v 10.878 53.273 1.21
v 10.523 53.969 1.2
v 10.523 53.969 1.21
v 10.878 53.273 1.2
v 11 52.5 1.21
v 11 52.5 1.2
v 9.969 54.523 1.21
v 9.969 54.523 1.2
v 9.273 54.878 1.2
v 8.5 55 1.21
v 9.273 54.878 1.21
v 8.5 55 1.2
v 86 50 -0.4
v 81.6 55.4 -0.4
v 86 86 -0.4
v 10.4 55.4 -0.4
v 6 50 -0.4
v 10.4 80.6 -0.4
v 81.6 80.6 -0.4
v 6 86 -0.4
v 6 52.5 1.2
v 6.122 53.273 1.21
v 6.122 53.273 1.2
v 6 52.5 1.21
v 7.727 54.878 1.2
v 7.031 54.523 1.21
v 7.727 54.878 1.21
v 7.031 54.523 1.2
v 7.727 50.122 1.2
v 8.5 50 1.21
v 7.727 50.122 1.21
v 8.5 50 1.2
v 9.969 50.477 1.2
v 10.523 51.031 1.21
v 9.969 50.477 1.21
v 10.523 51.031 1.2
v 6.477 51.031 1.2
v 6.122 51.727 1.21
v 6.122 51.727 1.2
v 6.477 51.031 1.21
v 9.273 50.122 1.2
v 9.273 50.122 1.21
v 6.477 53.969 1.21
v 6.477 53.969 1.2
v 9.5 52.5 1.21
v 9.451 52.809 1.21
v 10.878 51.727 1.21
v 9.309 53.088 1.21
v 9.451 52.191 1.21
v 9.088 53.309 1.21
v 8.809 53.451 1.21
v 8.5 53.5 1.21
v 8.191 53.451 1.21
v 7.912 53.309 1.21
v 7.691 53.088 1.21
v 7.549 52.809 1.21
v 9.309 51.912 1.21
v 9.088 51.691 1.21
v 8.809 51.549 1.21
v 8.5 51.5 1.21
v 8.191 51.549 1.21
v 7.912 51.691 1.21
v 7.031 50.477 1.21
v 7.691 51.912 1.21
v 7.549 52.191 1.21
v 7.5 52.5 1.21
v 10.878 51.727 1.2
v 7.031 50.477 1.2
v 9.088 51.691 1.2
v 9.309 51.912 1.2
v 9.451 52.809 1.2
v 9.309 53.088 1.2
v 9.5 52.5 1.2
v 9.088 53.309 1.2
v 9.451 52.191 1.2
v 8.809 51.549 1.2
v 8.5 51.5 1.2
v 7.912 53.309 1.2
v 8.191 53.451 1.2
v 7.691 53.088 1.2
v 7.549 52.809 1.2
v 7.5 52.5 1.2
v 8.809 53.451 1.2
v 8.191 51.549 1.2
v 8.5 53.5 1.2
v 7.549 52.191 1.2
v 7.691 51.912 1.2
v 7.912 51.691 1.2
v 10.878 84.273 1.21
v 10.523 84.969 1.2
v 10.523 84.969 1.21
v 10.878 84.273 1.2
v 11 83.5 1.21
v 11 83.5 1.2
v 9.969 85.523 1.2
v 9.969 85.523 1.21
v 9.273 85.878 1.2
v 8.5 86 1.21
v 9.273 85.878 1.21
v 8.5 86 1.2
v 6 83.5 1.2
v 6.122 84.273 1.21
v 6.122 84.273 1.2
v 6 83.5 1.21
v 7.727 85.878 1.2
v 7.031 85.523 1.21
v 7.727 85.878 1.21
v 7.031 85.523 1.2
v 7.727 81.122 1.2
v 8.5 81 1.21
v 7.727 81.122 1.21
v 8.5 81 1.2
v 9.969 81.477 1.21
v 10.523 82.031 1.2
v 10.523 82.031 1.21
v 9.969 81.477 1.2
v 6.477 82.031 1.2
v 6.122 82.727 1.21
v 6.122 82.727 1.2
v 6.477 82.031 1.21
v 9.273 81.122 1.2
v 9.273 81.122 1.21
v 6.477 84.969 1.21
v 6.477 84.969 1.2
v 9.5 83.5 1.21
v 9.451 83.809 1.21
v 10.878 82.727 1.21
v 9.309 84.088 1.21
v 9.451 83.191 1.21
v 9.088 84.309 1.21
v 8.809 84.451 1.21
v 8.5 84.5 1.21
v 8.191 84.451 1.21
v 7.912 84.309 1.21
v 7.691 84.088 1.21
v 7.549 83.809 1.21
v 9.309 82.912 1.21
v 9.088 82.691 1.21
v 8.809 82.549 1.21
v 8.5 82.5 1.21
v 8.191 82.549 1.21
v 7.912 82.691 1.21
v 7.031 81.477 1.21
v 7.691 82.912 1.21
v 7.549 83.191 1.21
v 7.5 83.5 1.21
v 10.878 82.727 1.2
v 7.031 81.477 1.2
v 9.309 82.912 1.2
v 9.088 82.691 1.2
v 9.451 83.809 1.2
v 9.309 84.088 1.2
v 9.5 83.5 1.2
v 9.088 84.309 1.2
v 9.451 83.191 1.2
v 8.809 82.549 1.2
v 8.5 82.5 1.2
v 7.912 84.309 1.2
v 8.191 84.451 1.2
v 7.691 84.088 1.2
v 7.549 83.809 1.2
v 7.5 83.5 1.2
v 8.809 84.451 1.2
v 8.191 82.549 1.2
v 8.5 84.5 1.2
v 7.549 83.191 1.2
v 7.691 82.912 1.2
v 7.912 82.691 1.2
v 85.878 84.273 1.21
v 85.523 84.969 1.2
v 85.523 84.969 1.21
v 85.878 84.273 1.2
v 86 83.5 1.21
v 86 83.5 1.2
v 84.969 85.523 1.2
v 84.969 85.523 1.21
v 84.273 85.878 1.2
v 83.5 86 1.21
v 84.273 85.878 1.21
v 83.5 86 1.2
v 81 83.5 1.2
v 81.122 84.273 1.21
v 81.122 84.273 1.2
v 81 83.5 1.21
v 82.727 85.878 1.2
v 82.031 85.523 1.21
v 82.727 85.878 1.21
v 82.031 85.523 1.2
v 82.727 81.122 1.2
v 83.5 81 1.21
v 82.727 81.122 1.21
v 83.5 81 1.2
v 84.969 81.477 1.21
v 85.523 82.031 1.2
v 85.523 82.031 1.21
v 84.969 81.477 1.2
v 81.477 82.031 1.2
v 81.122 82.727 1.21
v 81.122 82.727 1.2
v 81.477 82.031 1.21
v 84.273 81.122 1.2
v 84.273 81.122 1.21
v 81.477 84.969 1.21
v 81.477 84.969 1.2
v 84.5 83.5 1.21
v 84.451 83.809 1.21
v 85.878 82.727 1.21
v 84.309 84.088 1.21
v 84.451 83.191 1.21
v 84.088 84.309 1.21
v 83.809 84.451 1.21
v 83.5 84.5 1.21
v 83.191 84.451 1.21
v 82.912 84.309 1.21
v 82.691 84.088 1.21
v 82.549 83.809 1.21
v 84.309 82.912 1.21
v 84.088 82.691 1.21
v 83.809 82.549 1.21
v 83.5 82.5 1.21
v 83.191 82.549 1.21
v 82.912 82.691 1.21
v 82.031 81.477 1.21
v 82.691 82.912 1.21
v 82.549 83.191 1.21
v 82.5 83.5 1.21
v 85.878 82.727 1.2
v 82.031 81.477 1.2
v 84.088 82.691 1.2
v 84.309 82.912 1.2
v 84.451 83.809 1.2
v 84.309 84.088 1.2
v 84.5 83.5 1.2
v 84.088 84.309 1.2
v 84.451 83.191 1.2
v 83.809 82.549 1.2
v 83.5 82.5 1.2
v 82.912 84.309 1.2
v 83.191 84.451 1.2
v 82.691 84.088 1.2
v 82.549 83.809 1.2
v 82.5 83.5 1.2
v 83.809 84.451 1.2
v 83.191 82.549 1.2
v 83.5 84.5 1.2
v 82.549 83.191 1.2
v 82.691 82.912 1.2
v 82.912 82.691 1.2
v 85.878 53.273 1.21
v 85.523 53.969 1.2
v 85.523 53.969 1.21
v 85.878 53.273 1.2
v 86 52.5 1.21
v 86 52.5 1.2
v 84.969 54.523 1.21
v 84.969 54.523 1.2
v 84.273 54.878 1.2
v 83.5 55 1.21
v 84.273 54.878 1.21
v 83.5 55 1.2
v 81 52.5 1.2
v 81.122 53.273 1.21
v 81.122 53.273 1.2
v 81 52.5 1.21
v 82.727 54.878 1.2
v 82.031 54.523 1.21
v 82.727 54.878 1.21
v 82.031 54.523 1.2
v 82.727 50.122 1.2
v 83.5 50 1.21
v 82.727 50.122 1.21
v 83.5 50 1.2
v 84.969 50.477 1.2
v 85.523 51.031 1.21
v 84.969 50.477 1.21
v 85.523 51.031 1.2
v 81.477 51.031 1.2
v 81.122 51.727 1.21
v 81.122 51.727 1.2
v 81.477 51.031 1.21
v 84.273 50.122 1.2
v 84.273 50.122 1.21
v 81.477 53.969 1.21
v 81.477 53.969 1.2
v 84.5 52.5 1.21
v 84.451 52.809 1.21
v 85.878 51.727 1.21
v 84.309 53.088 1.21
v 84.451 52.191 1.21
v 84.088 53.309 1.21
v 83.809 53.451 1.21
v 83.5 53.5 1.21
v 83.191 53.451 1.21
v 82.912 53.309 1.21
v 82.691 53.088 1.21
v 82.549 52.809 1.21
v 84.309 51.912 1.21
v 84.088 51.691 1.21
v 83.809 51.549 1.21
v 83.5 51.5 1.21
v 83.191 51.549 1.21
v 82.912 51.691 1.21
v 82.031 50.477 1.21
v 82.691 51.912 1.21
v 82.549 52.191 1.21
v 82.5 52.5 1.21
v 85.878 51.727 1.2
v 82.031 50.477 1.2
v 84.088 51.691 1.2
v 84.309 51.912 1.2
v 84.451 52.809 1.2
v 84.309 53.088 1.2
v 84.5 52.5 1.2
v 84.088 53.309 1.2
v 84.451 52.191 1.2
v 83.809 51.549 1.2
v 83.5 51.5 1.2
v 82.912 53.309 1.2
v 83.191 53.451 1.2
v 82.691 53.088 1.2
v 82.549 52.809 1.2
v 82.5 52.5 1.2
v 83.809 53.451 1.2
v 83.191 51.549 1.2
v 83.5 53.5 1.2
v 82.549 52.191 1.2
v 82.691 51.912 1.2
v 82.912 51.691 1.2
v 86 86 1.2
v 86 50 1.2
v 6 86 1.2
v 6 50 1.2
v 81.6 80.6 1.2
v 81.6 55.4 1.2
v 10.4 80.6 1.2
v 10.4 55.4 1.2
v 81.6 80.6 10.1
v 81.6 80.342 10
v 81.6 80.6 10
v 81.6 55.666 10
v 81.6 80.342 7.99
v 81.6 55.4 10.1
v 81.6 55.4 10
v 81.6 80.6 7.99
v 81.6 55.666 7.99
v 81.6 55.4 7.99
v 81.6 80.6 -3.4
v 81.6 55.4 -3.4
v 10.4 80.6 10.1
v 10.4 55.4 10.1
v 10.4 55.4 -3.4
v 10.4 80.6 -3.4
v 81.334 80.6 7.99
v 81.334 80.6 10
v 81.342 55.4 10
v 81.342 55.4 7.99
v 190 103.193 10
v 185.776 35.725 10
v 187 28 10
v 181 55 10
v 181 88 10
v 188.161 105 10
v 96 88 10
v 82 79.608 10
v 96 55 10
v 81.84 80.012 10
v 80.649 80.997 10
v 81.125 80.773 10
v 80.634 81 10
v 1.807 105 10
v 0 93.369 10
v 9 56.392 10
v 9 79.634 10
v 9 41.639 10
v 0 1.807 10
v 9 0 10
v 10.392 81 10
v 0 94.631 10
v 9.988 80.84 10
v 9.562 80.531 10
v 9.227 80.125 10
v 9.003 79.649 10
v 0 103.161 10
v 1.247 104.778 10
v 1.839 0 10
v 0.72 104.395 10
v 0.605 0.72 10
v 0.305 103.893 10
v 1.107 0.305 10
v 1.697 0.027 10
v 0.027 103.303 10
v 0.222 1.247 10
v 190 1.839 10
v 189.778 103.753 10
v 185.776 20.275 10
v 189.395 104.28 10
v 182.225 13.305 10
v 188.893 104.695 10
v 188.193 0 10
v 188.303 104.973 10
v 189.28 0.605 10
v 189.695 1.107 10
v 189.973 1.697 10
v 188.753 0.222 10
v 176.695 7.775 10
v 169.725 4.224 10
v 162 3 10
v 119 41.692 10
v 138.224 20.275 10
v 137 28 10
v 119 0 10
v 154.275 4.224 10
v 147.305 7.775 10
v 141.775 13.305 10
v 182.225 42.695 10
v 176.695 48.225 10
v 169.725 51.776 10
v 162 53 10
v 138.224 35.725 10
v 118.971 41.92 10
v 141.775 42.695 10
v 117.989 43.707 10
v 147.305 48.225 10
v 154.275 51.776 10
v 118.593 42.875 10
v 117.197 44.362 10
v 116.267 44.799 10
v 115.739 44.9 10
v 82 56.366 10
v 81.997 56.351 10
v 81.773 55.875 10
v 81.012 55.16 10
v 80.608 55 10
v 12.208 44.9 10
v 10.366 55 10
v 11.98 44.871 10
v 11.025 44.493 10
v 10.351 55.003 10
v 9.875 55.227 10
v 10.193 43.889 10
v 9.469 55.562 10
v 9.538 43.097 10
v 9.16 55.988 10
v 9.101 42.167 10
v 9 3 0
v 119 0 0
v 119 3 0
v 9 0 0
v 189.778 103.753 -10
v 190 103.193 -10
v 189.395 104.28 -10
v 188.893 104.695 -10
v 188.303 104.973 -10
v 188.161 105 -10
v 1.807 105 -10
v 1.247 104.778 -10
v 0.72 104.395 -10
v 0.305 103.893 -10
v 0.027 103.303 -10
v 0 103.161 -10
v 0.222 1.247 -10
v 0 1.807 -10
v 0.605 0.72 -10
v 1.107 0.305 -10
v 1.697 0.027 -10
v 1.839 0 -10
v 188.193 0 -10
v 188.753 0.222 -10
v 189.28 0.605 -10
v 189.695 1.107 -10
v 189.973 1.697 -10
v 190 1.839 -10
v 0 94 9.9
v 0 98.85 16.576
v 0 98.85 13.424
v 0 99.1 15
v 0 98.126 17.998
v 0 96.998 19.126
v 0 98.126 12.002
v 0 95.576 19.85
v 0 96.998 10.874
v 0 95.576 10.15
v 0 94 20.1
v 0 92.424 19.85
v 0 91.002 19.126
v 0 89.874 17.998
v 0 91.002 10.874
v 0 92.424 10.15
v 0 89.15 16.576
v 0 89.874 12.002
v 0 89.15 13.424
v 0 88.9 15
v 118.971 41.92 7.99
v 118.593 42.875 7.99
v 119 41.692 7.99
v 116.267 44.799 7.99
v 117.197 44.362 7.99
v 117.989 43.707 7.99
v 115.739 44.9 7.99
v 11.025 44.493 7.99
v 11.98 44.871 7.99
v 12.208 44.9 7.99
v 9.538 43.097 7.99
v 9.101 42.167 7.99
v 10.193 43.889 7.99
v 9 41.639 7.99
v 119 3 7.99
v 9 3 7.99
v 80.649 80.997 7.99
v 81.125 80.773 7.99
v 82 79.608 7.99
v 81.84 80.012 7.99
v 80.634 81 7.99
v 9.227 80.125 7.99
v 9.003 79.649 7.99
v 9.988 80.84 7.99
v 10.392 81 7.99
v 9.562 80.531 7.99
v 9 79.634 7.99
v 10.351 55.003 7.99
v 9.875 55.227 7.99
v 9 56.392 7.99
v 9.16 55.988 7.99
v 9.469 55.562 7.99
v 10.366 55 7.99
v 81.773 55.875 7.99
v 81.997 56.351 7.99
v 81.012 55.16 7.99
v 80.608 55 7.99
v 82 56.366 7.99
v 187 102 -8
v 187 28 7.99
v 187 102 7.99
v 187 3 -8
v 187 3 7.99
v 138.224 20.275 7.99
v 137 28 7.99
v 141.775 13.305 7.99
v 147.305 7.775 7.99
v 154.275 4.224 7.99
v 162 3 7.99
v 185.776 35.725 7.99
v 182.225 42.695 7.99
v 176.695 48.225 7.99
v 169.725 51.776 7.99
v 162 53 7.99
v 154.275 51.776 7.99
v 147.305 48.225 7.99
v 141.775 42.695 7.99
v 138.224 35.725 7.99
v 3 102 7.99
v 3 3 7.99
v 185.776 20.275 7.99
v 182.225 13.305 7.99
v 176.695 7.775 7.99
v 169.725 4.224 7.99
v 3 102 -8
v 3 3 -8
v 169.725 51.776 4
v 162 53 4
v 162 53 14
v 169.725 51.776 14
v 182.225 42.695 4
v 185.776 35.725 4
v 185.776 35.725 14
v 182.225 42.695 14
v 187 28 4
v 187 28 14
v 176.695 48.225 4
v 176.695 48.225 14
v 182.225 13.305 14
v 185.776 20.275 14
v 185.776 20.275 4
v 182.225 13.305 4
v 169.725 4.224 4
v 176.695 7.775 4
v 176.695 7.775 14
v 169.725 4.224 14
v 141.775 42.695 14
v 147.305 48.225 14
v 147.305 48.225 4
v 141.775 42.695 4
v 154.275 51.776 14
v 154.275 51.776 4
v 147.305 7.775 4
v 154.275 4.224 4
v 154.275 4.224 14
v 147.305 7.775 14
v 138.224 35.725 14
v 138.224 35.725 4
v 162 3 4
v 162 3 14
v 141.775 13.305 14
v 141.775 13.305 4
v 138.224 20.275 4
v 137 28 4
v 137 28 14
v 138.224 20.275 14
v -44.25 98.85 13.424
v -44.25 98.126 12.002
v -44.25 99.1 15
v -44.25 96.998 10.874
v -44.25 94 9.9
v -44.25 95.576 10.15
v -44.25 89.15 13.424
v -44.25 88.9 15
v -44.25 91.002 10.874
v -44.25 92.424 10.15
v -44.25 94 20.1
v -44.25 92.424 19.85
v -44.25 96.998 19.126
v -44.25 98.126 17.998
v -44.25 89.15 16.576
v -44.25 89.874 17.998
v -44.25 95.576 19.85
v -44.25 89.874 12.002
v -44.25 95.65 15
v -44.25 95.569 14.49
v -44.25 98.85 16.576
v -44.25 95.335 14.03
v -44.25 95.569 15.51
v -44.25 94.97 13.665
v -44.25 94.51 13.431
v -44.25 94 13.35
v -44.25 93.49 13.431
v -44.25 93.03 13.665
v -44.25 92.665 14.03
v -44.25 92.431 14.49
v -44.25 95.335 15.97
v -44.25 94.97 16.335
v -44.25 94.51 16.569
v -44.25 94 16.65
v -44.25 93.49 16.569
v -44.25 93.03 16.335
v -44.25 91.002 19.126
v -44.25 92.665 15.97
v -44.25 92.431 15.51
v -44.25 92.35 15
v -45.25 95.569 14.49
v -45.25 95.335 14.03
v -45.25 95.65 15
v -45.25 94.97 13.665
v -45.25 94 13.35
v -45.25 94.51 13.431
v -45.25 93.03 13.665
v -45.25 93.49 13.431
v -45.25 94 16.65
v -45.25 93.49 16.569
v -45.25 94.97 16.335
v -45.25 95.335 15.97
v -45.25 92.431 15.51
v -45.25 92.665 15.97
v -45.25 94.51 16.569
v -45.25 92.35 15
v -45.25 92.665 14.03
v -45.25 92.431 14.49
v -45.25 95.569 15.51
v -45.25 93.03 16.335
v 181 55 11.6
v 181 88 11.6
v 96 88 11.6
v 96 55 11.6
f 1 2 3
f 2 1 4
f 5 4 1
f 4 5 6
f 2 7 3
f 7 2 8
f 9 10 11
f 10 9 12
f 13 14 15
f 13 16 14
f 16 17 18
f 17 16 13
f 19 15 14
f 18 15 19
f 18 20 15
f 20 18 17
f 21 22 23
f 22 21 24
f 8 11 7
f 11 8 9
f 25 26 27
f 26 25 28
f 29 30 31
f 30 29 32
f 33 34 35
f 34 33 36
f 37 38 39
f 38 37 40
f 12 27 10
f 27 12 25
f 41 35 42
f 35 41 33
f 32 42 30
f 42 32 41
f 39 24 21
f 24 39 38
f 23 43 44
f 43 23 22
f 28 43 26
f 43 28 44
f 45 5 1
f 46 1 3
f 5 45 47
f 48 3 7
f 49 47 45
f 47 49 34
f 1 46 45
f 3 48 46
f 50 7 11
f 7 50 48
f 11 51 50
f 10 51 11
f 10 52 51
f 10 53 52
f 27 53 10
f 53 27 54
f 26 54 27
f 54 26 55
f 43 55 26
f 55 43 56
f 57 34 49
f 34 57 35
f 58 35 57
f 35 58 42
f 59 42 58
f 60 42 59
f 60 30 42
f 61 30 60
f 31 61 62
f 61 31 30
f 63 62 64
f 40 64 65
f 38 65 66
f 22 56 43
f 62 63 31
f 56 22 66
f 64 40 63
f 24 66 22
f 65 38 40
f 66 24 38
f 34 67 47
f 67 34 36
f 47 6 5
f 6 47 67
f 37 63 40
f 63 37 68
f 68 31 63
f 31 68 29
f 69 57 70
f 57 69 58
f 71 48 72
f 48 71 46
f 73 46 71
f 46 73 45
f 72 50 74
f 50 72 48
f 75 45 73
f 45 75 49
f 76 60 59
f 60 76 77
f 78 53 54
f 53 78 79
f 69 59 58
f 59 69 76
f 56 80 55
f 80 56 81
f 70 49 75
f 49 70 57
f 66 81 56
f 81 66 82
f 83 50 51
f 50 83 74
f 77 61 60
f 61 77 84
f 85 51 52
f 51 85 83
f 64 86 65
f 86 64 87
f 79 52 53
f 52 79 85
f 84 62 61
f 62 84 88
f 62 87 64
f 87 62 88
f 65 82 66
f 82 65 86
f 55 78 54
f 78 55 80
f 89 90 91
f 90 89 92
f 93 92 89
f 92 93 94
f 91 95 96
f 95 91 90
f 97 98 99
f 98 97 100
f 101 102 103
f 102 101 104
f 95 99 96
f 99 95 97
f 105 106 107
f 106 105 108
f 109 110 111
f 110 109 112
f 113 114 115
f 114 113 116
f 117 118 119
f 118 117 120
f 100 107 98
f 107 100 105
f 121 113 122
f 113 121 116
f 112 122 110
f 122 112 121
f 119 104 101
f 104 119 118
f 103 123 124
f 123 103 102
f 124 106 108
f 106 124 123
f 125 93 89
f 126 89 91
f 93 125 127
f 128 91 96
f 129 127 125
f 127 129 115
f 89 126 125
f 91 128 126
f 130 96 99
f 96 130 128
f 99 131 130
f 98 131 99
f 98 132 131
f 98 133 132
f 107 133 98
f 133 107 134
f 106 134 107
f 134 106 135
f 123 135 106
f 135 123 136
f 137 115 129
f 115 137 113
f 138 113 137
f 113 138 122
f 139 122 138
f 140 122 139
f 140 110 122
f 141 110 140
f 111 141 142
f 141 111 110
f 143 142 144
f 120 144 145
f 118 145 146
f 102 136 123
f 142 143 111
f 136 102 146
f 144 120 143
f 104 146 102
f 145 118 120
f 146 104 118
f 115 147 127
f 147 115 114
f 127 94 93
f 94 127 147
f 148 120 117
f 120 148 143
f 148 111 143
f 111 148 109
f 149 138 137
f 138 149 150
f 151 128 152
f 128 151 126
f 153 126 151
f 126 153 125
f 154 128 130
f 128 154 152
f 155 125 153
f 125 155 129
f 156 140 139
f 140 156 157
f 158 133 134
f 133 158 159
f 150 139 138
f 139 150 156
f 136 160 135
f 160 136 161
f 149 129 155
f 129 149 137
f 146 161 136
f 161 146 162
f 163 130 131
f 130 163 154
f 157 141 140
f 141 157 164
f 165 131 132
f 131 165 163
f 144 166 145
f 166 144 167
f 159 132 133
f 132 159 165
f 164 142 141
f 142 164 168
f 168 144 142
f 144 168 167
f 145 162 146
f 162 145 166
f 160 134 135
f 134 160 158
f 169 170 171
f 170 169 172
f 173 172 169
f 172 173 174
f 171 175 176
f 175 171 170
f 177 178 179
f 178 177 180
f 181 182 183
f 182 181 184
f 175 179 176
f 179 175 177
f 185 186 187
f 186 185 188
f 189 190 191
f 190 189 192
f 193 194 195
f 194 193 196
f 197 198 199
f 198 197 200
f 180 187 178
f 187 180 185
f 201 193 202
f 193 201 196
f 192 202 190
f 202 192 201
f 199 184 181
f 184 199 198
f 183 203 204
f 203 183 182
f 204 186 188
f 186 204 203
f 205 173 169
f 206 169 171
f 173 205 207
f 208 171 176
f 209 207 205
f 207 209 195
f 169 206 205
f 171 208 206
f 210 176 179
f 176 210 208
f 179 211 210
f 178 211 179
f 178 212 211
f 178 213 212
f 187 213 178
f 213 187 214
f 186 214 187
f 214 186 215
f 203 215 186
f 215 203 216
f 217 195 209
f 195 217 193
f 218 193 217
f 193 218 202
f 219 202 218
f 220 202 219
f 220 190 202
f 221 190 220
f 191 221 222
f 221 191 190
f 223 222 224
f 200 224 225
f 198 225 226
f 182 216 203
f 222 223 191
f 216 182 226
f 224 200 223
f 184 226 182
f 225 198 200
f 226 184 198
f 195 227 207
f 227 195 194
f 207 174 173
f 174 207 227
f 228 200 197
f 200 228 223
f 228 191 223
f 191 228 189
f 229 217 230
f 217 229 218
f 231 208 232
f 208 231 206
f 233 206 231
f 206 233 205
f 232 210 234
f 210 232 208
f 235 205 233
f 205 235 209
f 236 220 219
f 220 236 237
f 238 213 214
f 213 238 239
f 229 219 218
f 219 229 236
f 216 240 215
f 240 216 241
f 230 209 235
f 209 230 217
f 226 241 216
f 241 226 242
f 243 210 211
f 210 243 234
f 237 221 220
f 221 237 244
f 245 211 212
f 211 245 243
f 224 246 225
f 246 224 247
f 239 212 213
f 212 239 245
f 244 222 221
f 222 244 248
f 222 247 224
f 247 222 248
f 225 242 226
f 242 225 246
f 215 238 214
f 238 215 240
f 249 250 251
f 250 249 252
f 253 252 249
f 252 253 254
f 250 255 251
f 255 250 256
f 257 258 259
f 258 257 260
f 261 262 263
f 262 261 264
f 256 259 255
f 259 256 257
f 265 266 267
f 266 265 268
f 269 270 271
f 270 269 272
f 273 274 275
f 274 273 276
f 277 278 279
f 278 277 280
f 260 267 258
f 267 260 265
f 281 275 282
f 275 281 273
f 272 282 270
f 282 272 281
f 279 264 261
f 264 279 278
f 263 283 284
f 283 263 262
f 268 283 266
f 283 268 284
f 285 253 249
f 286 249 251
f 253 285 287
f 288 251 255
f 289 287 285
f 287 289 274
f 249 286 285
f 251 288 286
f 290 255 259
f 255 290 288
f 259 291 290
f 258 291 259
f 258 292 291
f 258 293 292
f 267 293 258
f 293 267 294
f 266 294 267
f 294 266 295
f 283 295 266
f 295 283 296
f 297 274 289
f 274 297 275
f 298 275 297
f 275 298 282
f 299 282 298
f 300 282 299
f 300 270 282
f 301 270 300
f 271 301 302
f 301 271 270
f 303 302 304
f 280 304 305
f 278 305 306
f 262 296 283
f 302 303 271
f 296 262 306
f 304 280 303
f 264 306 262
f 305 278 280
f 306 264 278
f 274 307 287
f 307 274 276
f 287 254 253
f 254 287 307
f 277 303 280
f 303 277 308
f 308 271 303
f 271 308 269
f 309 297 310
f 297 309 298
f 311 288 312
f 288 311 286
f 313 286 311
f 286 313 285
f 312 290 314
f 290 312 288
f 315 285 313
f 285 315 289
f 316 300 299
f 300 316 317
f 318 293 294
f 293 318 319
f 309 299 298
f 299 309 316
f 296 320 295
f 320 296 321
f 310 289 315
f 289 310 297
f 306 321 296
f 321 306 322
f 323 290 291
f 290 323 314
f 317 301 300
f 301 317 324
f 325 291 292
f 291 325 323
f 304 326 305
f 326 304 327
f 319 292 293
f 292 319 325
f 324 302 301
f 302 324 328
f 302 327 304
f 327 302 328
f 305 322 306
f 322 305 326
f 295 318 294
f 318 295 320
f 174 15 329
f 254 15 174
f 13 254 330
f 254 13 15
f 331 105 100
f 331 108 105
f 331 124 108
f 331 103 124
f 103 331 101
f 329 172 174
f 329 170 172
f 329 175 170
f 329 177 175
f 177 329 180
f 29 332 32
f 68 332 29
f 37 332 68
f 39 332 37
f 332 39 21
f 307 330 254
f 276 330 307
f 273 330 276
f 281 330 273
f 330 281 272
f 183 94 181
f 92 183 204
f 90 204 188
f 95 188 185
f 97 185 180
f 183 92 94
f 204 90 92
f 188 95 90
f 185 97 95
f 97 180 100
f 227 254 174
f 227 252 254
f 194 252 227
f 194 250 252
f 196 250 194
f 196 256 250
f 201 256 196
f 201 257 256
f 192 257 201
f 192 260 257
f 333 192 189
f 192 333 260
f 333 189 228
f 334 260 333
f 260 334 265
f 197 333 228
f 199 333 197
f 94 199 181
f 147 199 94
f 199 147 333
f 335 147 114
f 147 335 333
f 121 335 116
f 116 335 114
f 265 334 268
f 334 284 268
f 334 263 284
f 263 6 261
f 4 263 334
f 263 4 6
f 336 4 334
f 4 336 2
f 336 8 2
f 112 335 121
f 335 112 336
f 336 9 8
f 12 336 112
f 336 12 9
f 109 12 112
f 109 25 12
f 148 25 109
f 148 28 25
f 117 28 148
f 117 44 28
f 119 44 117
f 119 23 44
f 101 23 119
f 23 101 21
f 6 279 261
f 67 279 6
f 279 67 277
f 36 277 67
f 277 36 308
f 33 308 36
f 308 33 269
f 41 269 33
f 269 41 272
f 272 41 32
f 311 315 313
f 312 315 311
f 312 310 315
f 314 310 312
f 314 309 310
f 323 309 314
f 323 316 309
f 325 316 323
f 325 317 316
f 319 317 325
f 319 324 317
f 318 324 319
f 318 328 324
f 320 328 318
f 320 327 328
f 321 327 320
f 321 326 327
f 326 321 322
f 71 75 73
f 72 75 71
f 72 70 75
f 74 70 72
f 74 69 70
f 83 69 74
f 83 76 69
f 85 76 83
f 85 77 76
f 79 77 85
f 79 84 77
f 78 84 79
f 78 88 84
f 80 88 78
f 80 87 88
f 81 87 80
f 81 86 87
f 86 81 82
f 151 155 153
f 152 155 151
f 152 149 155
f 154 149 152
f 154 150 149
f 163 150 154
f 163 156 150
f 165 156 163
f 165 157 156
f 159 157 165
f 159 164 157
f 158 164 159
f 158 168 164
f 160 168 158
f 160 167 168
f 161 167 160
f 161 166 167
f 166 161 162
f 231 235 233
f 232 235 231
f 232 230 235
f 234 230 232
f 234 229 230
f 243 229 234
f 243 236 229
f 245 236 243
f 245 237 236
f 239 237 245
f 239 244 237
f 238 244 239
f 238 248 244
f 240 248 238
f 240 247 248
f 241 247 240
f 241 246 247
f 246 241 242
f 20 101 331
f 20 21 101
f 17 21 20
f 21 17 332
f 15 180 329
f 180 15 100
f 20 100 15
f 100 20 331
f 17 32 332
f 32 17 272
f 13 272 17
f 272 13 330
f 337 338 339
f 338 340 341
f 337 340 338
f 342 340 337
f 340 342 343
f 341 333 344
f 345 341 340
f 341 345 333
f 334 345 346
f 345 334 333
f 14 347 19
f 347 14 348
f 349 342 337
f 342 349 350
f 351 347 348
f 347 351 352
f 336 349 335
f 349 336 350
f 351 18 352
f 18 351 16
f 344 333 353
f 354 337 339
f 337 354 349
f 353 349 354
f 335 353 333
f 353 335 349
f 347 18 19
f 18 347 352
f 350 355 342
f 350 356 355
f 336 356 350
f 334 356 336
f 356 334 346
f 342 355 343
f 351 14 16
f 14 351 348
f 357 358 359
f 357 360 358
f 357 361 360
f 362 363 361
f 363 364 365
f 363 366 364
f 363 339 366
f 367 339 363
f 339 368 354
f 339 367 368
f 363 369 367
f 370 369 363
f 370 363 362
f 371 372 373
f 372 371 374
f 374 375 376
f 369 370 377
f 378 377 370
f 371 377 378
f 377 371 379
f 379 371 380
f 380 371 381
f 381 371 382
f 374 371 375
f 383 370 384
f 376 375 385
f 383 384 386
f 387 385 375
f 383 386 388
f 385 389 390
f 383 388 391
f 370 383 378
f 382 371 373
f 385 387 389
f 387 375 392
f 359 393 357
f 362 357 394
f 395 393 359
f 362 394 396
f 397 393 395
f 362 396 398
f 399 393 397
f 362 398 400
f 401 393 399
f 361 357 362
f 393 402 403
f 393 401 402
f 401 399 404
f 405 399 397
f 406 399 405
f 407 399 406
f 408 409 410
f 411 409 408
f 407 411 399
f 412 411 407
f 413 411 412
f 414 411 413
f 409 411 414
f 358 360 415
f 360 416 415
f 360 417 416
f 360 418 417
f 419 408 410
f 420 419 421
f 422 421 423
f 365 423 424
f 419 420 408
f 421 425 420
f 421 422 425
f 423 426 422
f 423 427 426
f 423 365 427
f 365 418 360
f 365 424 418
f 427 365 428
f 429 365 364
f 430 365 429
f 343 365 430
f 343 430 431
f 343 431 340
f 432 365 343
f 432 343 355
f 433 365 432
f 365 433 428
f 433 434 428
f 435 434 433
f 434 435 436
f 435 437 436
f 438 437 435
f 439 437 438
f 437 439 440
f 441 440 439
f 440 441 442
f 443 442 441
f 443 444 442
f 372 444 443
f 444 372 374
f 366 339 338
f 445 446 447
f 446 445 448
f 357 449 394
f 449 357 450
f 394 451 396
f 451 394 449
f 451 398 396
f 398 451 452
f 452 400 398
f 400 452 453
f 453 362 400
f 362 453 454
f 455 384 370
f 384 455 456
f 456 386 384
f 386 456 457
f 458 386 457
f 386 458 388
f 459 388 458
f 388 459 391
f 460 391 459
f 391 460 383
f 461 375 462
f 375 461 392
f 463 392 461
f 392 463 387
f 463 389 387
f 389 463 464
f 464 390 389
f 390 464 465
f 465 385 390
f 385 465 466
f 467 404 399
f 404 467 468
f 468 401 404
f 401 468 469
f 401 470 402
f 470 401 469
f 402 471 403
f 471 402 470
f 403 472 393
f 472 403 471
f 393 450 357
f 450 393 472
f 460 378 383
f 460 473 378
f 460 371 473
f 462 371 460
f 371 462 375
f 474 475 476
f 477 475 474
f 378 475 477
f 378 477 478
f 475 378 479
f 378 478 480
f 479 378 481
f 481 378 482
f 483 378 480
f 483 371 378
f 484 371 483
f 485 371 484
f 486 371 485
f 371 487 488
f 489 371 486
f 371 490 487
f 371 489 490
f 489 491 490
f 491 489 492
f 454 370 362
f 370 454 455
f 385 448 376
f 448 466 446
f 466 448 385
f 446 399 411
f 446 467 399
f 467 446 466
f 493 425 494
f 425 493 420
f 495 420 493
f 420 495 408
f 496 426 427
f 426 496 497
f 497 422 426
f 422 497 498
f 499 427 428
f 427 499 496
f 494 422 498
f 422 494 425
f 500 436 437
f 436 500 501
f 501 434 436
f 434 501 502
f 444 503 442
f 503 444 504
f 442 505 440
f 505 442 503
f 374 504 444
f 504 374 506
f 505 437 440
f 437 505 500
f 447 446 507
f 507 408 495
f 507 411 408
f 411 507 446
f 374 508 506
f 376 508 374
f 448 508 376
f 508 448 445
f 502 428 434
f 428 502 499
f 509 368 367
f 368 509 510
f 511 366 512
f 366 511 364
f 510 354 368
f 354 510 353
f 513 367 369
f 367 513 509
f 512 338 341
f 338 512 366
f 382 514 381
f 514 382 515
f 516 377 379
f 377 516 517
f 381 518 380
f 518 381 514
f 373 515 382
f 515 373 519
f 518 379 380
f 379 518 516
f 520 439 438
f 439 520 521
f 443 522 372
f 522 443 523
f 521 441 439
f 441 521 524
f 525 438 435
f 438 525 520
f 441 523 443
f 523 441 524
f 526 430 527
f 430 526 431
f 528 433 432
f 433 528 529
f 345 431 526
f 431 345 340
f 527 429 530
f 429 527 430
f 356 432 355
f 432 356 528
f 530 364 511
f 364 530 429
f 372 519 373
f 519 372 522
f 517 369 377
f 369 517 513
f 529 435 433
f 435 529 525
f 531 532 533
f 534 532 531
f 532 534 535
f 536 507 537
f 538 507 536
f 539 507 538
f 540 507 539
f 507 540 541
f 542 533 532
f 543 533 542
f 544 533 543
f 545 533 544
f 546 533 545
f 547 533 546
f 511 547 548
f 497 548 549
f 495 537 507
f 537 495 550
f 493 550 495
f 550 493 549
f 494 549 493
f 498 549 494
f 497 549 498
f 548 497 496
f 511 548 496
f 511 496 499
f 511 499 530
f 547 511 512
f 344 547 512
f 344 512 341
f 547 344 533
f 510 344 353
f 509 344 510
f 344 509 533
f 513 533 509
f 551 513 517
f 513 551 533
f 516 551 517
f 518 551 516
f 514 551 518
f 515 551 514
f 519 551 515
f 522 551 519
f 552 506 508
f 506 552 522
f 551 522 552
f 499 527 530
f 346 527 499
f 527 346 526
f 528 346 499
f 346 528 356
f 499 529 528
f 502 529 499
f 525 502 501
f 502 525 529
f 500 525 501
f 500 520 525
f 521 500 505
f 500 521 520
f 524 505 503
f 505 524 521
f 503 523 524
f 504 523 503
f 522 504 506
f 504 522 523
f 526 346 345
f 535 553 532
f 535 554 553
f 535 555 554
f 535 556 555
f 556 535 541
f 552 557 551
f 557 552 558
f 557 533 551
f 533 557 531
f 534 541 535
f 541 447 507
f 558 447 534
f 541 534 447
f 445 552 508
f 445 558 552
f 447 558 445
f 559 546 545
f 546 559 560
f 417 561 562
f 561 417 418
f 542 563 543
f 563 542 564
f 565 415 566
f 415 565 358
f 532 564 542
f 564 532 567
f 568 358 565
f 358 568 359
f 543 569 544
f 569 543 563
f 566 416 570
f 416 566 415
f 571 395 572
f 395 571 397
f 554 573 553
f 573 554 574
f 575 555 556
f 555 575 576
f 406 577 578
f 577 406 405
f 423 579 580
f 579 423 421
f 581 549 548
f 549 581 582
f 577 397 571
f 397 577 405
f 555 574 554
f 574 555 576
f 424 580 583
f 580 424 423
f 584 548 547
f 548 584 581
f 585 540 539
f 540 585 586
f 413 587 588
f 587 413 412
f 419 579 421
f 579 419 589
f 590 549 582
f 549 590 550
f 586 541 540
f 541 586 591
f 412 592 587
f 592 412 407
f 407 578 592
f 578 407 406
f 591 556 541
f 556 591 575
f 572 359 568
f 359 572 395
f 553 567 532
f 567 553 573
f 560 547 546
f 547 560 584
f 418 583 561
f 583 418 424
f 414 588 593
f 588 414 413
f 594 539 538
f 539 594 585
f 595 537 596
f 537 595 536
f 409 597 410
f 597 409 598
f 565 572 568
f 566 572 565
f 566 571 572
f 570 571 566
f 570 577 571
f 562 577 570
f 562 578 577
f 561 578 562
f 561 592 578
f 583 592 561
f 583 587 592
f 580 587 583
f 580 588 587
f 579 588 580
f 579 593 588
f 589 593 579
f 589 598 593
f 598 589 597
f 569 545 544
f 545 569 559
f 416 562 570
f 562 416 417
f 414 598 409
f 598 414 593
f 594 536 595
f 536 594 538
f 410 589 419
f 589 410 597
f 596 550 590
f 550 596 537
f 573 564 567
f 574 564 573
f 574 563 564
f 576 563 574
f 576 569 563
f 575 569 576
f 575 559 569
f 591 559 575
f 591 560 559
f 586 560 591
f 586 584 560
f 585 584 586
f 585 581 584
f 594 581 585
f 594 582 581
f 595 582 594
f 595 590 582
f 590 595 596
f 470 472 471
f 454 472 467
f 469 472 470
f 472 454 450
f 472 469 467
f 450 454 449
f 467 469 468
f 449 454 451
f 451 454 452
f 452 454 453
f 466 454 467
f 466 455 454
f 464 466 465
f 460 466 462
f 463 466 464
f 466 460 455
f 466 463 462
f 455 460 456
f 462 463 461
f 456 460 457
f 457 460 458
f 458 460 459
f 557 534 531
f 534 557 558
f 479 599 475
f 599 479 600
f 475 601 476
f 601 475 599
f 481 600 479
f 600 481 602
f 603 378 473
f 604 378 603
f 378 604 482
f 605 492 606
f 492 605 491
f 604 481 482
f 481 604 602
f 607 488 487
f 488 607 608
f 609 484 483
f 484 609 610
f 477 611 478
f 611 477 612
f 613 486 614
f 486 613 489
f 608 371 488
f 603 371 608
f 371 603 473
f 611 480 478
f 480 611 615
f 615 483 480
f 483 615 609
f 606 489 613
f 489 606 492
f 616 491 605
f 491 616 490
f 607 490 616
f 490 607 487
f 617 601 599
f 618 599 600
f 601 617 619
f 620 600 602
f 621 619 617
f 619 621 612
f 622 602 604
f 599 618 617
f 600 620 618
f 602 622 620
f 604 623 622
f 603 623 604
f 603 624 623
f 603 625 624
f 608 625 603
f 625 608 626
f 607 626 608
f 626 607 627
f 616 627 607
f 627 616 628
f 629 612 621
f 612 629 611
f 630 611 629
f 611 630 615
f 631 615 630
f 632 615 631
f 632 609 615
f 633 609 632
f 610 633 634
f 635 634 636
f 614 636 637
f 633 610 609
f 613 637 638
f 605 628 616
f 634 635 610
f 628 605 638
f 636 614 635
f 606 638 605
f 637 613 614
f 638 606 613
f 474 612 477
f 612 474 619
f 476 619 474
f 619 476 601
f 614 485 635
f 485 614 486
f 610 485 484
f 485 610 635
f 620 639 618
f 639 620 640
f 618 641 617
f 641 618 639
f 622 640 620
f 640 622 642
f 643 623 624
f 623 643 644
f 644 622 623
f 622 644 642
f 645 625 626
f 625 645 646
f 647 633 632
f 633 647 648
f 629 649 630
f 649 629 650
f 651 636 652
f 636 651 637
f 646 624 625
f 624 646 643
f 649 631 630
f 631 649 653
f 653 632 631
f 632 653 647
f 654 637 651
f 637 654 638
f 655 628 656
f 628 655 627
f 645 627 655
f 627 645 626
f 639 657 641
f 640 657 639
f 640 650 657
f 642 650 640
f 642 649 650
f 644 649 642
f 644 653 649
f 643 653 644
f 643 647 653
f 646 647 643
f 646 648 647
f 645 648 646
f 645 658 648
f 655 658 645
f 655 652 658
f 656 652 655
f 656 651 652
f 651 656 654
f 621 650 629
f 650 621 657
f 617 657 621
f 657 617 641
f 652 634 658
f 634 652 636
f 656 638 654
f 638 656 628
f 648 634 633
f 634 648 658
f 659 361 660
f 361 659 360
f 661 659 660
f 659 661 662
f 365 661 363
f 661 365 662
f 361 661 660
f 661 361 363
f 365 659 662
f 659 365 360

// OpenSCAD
// file: roundCornersCube.scad
/*
http://codeviewer.org/view/code:1b36 
Copyright (C) 2011 Sergio Vilches
This program is free software: you can redistribute it and/or modify it under the terms of the GNU General Public License as published by the Free Software Foundation, either version 3 of the License, or (at your option) any later version.
This program is distributed in the hope that it will be useful, but WITHOUT ANY WARRANTY; without even the implied warranty of MERCHANTABILITY or FITNESS FOR A PARTICULAR PURPOSE. See the GNU General Public License for more details. You should have received a copy of the GNU General Public License along with this program. If not, see <http://www.gnu.org/licenses/>.
Contact: s.vilches.e@gmail.com


    ----------------------------------------------------------- 
                 Round Corners Cube (Extruded)                
      roundCornersCube(x,y,z,r) Where:                        
         - x = Xdir width                                     
         - y = Ydir width                                     
         - z = Height of the cube                             
         - r = Rounding radious                               
                                                              
      Example: roundCornerCube(10,10,2,1);                    
     *Some times it's needed to use F6 to see good results!   
 	 ----------------------------------------------------------- 
*/
// Test it!
// roundCornersCube(10,5,2,1);


module createMeniscus(h,radius) // This module creates the shape that needs to be substracted from a cube to make its corners rounded.
difference(){        //This shape is basicly the difference between a quarter of cylinder and a cube
   translate([radius/2+0.1,radius/2+0.1,0]){
      cube([radius+0.2,radius+0.1,h+0.2],center=true);         // All that 0.x numbers are to avoid "ghost boundaries" when substracting
   }

   cylinder(h=h+0.2,r=radius,$fn = 25,center=true);
}


module roundCornersCube(x,y,z,r)  // Now we just substract the shape we have created in the four corners
difference(){
   cube([x,y,z], center=true);

translate([x/2-r,y/2-r]){  // We move to the first corner (x,y)
      rotate(0){  
         createMeniscus(z,r); // And substract the meniscus
      }
   }
   translate([-x/2+r,y/2-r]){ // To the second corner (-x,y)
      rotate(90){
         createMeniscus(z,r); // But this time we have to rotate the meniscus 90 deg
      }
   }
      translate([-x/2+r,-y/2+r]){ // ... 
      rotate(180){
         createMeniscus(z,r);
      }
   }
      translate([x/2-r,-y/2+r]){
      rotate(270){
         createMeniscus(z,r);
      }
   }
}

module createSubtractor(h,radius) //Create the shape that needs to be substracted from a cube
difference(){ cube([radius+0.1,radius+0.1,h]); cylinder(h=h,r=radius+0.1,$fn = 25); } //+0.1 stops ghost edges

module rCube(x,y,z,r)//Create a cube and subtract the 4 corners
difference(){
cube([x,y,z]);
translate([x-r,y-r]) rotate(0) createSubtractor(z,r); 
translate([r,y-r]) rotate(90) createSubtractor(z,r);
translate([r,r]) rotate(180) createSubtractor(z,r);
translate([x-r,r]) rotate(270) createSubtractor(z,r);
}
// main file
$fn = 20;

include <roundCornersCube.scad>


/////CASE SIZE/////
//case length (outer)
cl = 190;

//case width (outer)
cw = 105;

//case bottom height
cbh = 10;

//case bottom thickness
cbth = 2;

//case top height
cth = 10;


//case top thickness
ctth = 2;

//case roundness radius
crr = 2.5;

//case wall thickness
cwth = 3;

//case key holes width
ckhw = 45;

//case key holes length
ckhl = 110;

//case display hole length
cdhl = 73;

//case display hole width
cdhw = 26;

//case display hole radius
cdhr = 2;



module atmega()
{
color("yellow")
//cube([53, 16, 5]);
cube([85, 33, 1.6]);
}


module AAA_battery()
{
  cylinder(r=10.2/2, h=44.25);
  translate([0,0,44.25])
  cylinder(r=3.3/2, h=1);
}



module small_display()
{
//display outer
do = [58, 32, 1.6];
//display display
dd = [71.2, 25.2, 13.5];

cube(do);

}


module display()
{
//display outer
do = [80, 36, 1.6];
//display display
dd = [71.2, 25.2, 13.5];

cube(do);
translate([4.4,5.4,-3])
color("lightblue")
cube(dd);

module hole()
{
difference()
{
color("red")
cylinder(r=2.5, h=1.61);
cylinder(r=1, h=18);
}
}
//holes
translate([2.5, 2.5,0])
hole();

translate([2.5, do[1]-2.5,0])
hole();

translate([do[0]-2.5, do[1]-2.5,0])
hole();

translate([do[0]-2.5,2.5,0])
hole();
}


module white_key()
{


}


module case_bottom()
{
  difference()
  {
  rCube(cl, cw, cbh,crr);

  translate([cwth,cwth,ctth])
  cube([cl-cwth*2, cw-cwth*2, cbh]);

  }
  
}

module case_top()
{

  difference()
  {
    rCube(cl, cw, cth, crr);
    translate([cwth*3,-.1,-1])
    {
      rCube(ckhl, ckhw, cth*2, 4);
      translate([0,-4,0])
      cube([ckhl, ckhw, cth*2]);
    }

    translate([cwth,cwth,-.01])
    cube([cl-cwth*2, cw-cwth*2, cth-ctth]);

    //display hole
    translate([cwth*3,55,0])
    rCube(cdhl, cdhw, 22, cdhr);

  }


  //speaker hole
  translate([cl-25-cwth,cwth*1+25,4])
  color("red")
  cylinder(r=25, h=10);

}

translate([cwth*2,50,-2.4+2])
display();

//translate([0,0,20])
//small_display();
case_top();
translate([0,0,-cbh])
case_bottom();
translate([96,55,10])
atmega();
translate([0,94,15])

rotate([-90,0,90])
//translate([190,0,0])
AAA_battery();
